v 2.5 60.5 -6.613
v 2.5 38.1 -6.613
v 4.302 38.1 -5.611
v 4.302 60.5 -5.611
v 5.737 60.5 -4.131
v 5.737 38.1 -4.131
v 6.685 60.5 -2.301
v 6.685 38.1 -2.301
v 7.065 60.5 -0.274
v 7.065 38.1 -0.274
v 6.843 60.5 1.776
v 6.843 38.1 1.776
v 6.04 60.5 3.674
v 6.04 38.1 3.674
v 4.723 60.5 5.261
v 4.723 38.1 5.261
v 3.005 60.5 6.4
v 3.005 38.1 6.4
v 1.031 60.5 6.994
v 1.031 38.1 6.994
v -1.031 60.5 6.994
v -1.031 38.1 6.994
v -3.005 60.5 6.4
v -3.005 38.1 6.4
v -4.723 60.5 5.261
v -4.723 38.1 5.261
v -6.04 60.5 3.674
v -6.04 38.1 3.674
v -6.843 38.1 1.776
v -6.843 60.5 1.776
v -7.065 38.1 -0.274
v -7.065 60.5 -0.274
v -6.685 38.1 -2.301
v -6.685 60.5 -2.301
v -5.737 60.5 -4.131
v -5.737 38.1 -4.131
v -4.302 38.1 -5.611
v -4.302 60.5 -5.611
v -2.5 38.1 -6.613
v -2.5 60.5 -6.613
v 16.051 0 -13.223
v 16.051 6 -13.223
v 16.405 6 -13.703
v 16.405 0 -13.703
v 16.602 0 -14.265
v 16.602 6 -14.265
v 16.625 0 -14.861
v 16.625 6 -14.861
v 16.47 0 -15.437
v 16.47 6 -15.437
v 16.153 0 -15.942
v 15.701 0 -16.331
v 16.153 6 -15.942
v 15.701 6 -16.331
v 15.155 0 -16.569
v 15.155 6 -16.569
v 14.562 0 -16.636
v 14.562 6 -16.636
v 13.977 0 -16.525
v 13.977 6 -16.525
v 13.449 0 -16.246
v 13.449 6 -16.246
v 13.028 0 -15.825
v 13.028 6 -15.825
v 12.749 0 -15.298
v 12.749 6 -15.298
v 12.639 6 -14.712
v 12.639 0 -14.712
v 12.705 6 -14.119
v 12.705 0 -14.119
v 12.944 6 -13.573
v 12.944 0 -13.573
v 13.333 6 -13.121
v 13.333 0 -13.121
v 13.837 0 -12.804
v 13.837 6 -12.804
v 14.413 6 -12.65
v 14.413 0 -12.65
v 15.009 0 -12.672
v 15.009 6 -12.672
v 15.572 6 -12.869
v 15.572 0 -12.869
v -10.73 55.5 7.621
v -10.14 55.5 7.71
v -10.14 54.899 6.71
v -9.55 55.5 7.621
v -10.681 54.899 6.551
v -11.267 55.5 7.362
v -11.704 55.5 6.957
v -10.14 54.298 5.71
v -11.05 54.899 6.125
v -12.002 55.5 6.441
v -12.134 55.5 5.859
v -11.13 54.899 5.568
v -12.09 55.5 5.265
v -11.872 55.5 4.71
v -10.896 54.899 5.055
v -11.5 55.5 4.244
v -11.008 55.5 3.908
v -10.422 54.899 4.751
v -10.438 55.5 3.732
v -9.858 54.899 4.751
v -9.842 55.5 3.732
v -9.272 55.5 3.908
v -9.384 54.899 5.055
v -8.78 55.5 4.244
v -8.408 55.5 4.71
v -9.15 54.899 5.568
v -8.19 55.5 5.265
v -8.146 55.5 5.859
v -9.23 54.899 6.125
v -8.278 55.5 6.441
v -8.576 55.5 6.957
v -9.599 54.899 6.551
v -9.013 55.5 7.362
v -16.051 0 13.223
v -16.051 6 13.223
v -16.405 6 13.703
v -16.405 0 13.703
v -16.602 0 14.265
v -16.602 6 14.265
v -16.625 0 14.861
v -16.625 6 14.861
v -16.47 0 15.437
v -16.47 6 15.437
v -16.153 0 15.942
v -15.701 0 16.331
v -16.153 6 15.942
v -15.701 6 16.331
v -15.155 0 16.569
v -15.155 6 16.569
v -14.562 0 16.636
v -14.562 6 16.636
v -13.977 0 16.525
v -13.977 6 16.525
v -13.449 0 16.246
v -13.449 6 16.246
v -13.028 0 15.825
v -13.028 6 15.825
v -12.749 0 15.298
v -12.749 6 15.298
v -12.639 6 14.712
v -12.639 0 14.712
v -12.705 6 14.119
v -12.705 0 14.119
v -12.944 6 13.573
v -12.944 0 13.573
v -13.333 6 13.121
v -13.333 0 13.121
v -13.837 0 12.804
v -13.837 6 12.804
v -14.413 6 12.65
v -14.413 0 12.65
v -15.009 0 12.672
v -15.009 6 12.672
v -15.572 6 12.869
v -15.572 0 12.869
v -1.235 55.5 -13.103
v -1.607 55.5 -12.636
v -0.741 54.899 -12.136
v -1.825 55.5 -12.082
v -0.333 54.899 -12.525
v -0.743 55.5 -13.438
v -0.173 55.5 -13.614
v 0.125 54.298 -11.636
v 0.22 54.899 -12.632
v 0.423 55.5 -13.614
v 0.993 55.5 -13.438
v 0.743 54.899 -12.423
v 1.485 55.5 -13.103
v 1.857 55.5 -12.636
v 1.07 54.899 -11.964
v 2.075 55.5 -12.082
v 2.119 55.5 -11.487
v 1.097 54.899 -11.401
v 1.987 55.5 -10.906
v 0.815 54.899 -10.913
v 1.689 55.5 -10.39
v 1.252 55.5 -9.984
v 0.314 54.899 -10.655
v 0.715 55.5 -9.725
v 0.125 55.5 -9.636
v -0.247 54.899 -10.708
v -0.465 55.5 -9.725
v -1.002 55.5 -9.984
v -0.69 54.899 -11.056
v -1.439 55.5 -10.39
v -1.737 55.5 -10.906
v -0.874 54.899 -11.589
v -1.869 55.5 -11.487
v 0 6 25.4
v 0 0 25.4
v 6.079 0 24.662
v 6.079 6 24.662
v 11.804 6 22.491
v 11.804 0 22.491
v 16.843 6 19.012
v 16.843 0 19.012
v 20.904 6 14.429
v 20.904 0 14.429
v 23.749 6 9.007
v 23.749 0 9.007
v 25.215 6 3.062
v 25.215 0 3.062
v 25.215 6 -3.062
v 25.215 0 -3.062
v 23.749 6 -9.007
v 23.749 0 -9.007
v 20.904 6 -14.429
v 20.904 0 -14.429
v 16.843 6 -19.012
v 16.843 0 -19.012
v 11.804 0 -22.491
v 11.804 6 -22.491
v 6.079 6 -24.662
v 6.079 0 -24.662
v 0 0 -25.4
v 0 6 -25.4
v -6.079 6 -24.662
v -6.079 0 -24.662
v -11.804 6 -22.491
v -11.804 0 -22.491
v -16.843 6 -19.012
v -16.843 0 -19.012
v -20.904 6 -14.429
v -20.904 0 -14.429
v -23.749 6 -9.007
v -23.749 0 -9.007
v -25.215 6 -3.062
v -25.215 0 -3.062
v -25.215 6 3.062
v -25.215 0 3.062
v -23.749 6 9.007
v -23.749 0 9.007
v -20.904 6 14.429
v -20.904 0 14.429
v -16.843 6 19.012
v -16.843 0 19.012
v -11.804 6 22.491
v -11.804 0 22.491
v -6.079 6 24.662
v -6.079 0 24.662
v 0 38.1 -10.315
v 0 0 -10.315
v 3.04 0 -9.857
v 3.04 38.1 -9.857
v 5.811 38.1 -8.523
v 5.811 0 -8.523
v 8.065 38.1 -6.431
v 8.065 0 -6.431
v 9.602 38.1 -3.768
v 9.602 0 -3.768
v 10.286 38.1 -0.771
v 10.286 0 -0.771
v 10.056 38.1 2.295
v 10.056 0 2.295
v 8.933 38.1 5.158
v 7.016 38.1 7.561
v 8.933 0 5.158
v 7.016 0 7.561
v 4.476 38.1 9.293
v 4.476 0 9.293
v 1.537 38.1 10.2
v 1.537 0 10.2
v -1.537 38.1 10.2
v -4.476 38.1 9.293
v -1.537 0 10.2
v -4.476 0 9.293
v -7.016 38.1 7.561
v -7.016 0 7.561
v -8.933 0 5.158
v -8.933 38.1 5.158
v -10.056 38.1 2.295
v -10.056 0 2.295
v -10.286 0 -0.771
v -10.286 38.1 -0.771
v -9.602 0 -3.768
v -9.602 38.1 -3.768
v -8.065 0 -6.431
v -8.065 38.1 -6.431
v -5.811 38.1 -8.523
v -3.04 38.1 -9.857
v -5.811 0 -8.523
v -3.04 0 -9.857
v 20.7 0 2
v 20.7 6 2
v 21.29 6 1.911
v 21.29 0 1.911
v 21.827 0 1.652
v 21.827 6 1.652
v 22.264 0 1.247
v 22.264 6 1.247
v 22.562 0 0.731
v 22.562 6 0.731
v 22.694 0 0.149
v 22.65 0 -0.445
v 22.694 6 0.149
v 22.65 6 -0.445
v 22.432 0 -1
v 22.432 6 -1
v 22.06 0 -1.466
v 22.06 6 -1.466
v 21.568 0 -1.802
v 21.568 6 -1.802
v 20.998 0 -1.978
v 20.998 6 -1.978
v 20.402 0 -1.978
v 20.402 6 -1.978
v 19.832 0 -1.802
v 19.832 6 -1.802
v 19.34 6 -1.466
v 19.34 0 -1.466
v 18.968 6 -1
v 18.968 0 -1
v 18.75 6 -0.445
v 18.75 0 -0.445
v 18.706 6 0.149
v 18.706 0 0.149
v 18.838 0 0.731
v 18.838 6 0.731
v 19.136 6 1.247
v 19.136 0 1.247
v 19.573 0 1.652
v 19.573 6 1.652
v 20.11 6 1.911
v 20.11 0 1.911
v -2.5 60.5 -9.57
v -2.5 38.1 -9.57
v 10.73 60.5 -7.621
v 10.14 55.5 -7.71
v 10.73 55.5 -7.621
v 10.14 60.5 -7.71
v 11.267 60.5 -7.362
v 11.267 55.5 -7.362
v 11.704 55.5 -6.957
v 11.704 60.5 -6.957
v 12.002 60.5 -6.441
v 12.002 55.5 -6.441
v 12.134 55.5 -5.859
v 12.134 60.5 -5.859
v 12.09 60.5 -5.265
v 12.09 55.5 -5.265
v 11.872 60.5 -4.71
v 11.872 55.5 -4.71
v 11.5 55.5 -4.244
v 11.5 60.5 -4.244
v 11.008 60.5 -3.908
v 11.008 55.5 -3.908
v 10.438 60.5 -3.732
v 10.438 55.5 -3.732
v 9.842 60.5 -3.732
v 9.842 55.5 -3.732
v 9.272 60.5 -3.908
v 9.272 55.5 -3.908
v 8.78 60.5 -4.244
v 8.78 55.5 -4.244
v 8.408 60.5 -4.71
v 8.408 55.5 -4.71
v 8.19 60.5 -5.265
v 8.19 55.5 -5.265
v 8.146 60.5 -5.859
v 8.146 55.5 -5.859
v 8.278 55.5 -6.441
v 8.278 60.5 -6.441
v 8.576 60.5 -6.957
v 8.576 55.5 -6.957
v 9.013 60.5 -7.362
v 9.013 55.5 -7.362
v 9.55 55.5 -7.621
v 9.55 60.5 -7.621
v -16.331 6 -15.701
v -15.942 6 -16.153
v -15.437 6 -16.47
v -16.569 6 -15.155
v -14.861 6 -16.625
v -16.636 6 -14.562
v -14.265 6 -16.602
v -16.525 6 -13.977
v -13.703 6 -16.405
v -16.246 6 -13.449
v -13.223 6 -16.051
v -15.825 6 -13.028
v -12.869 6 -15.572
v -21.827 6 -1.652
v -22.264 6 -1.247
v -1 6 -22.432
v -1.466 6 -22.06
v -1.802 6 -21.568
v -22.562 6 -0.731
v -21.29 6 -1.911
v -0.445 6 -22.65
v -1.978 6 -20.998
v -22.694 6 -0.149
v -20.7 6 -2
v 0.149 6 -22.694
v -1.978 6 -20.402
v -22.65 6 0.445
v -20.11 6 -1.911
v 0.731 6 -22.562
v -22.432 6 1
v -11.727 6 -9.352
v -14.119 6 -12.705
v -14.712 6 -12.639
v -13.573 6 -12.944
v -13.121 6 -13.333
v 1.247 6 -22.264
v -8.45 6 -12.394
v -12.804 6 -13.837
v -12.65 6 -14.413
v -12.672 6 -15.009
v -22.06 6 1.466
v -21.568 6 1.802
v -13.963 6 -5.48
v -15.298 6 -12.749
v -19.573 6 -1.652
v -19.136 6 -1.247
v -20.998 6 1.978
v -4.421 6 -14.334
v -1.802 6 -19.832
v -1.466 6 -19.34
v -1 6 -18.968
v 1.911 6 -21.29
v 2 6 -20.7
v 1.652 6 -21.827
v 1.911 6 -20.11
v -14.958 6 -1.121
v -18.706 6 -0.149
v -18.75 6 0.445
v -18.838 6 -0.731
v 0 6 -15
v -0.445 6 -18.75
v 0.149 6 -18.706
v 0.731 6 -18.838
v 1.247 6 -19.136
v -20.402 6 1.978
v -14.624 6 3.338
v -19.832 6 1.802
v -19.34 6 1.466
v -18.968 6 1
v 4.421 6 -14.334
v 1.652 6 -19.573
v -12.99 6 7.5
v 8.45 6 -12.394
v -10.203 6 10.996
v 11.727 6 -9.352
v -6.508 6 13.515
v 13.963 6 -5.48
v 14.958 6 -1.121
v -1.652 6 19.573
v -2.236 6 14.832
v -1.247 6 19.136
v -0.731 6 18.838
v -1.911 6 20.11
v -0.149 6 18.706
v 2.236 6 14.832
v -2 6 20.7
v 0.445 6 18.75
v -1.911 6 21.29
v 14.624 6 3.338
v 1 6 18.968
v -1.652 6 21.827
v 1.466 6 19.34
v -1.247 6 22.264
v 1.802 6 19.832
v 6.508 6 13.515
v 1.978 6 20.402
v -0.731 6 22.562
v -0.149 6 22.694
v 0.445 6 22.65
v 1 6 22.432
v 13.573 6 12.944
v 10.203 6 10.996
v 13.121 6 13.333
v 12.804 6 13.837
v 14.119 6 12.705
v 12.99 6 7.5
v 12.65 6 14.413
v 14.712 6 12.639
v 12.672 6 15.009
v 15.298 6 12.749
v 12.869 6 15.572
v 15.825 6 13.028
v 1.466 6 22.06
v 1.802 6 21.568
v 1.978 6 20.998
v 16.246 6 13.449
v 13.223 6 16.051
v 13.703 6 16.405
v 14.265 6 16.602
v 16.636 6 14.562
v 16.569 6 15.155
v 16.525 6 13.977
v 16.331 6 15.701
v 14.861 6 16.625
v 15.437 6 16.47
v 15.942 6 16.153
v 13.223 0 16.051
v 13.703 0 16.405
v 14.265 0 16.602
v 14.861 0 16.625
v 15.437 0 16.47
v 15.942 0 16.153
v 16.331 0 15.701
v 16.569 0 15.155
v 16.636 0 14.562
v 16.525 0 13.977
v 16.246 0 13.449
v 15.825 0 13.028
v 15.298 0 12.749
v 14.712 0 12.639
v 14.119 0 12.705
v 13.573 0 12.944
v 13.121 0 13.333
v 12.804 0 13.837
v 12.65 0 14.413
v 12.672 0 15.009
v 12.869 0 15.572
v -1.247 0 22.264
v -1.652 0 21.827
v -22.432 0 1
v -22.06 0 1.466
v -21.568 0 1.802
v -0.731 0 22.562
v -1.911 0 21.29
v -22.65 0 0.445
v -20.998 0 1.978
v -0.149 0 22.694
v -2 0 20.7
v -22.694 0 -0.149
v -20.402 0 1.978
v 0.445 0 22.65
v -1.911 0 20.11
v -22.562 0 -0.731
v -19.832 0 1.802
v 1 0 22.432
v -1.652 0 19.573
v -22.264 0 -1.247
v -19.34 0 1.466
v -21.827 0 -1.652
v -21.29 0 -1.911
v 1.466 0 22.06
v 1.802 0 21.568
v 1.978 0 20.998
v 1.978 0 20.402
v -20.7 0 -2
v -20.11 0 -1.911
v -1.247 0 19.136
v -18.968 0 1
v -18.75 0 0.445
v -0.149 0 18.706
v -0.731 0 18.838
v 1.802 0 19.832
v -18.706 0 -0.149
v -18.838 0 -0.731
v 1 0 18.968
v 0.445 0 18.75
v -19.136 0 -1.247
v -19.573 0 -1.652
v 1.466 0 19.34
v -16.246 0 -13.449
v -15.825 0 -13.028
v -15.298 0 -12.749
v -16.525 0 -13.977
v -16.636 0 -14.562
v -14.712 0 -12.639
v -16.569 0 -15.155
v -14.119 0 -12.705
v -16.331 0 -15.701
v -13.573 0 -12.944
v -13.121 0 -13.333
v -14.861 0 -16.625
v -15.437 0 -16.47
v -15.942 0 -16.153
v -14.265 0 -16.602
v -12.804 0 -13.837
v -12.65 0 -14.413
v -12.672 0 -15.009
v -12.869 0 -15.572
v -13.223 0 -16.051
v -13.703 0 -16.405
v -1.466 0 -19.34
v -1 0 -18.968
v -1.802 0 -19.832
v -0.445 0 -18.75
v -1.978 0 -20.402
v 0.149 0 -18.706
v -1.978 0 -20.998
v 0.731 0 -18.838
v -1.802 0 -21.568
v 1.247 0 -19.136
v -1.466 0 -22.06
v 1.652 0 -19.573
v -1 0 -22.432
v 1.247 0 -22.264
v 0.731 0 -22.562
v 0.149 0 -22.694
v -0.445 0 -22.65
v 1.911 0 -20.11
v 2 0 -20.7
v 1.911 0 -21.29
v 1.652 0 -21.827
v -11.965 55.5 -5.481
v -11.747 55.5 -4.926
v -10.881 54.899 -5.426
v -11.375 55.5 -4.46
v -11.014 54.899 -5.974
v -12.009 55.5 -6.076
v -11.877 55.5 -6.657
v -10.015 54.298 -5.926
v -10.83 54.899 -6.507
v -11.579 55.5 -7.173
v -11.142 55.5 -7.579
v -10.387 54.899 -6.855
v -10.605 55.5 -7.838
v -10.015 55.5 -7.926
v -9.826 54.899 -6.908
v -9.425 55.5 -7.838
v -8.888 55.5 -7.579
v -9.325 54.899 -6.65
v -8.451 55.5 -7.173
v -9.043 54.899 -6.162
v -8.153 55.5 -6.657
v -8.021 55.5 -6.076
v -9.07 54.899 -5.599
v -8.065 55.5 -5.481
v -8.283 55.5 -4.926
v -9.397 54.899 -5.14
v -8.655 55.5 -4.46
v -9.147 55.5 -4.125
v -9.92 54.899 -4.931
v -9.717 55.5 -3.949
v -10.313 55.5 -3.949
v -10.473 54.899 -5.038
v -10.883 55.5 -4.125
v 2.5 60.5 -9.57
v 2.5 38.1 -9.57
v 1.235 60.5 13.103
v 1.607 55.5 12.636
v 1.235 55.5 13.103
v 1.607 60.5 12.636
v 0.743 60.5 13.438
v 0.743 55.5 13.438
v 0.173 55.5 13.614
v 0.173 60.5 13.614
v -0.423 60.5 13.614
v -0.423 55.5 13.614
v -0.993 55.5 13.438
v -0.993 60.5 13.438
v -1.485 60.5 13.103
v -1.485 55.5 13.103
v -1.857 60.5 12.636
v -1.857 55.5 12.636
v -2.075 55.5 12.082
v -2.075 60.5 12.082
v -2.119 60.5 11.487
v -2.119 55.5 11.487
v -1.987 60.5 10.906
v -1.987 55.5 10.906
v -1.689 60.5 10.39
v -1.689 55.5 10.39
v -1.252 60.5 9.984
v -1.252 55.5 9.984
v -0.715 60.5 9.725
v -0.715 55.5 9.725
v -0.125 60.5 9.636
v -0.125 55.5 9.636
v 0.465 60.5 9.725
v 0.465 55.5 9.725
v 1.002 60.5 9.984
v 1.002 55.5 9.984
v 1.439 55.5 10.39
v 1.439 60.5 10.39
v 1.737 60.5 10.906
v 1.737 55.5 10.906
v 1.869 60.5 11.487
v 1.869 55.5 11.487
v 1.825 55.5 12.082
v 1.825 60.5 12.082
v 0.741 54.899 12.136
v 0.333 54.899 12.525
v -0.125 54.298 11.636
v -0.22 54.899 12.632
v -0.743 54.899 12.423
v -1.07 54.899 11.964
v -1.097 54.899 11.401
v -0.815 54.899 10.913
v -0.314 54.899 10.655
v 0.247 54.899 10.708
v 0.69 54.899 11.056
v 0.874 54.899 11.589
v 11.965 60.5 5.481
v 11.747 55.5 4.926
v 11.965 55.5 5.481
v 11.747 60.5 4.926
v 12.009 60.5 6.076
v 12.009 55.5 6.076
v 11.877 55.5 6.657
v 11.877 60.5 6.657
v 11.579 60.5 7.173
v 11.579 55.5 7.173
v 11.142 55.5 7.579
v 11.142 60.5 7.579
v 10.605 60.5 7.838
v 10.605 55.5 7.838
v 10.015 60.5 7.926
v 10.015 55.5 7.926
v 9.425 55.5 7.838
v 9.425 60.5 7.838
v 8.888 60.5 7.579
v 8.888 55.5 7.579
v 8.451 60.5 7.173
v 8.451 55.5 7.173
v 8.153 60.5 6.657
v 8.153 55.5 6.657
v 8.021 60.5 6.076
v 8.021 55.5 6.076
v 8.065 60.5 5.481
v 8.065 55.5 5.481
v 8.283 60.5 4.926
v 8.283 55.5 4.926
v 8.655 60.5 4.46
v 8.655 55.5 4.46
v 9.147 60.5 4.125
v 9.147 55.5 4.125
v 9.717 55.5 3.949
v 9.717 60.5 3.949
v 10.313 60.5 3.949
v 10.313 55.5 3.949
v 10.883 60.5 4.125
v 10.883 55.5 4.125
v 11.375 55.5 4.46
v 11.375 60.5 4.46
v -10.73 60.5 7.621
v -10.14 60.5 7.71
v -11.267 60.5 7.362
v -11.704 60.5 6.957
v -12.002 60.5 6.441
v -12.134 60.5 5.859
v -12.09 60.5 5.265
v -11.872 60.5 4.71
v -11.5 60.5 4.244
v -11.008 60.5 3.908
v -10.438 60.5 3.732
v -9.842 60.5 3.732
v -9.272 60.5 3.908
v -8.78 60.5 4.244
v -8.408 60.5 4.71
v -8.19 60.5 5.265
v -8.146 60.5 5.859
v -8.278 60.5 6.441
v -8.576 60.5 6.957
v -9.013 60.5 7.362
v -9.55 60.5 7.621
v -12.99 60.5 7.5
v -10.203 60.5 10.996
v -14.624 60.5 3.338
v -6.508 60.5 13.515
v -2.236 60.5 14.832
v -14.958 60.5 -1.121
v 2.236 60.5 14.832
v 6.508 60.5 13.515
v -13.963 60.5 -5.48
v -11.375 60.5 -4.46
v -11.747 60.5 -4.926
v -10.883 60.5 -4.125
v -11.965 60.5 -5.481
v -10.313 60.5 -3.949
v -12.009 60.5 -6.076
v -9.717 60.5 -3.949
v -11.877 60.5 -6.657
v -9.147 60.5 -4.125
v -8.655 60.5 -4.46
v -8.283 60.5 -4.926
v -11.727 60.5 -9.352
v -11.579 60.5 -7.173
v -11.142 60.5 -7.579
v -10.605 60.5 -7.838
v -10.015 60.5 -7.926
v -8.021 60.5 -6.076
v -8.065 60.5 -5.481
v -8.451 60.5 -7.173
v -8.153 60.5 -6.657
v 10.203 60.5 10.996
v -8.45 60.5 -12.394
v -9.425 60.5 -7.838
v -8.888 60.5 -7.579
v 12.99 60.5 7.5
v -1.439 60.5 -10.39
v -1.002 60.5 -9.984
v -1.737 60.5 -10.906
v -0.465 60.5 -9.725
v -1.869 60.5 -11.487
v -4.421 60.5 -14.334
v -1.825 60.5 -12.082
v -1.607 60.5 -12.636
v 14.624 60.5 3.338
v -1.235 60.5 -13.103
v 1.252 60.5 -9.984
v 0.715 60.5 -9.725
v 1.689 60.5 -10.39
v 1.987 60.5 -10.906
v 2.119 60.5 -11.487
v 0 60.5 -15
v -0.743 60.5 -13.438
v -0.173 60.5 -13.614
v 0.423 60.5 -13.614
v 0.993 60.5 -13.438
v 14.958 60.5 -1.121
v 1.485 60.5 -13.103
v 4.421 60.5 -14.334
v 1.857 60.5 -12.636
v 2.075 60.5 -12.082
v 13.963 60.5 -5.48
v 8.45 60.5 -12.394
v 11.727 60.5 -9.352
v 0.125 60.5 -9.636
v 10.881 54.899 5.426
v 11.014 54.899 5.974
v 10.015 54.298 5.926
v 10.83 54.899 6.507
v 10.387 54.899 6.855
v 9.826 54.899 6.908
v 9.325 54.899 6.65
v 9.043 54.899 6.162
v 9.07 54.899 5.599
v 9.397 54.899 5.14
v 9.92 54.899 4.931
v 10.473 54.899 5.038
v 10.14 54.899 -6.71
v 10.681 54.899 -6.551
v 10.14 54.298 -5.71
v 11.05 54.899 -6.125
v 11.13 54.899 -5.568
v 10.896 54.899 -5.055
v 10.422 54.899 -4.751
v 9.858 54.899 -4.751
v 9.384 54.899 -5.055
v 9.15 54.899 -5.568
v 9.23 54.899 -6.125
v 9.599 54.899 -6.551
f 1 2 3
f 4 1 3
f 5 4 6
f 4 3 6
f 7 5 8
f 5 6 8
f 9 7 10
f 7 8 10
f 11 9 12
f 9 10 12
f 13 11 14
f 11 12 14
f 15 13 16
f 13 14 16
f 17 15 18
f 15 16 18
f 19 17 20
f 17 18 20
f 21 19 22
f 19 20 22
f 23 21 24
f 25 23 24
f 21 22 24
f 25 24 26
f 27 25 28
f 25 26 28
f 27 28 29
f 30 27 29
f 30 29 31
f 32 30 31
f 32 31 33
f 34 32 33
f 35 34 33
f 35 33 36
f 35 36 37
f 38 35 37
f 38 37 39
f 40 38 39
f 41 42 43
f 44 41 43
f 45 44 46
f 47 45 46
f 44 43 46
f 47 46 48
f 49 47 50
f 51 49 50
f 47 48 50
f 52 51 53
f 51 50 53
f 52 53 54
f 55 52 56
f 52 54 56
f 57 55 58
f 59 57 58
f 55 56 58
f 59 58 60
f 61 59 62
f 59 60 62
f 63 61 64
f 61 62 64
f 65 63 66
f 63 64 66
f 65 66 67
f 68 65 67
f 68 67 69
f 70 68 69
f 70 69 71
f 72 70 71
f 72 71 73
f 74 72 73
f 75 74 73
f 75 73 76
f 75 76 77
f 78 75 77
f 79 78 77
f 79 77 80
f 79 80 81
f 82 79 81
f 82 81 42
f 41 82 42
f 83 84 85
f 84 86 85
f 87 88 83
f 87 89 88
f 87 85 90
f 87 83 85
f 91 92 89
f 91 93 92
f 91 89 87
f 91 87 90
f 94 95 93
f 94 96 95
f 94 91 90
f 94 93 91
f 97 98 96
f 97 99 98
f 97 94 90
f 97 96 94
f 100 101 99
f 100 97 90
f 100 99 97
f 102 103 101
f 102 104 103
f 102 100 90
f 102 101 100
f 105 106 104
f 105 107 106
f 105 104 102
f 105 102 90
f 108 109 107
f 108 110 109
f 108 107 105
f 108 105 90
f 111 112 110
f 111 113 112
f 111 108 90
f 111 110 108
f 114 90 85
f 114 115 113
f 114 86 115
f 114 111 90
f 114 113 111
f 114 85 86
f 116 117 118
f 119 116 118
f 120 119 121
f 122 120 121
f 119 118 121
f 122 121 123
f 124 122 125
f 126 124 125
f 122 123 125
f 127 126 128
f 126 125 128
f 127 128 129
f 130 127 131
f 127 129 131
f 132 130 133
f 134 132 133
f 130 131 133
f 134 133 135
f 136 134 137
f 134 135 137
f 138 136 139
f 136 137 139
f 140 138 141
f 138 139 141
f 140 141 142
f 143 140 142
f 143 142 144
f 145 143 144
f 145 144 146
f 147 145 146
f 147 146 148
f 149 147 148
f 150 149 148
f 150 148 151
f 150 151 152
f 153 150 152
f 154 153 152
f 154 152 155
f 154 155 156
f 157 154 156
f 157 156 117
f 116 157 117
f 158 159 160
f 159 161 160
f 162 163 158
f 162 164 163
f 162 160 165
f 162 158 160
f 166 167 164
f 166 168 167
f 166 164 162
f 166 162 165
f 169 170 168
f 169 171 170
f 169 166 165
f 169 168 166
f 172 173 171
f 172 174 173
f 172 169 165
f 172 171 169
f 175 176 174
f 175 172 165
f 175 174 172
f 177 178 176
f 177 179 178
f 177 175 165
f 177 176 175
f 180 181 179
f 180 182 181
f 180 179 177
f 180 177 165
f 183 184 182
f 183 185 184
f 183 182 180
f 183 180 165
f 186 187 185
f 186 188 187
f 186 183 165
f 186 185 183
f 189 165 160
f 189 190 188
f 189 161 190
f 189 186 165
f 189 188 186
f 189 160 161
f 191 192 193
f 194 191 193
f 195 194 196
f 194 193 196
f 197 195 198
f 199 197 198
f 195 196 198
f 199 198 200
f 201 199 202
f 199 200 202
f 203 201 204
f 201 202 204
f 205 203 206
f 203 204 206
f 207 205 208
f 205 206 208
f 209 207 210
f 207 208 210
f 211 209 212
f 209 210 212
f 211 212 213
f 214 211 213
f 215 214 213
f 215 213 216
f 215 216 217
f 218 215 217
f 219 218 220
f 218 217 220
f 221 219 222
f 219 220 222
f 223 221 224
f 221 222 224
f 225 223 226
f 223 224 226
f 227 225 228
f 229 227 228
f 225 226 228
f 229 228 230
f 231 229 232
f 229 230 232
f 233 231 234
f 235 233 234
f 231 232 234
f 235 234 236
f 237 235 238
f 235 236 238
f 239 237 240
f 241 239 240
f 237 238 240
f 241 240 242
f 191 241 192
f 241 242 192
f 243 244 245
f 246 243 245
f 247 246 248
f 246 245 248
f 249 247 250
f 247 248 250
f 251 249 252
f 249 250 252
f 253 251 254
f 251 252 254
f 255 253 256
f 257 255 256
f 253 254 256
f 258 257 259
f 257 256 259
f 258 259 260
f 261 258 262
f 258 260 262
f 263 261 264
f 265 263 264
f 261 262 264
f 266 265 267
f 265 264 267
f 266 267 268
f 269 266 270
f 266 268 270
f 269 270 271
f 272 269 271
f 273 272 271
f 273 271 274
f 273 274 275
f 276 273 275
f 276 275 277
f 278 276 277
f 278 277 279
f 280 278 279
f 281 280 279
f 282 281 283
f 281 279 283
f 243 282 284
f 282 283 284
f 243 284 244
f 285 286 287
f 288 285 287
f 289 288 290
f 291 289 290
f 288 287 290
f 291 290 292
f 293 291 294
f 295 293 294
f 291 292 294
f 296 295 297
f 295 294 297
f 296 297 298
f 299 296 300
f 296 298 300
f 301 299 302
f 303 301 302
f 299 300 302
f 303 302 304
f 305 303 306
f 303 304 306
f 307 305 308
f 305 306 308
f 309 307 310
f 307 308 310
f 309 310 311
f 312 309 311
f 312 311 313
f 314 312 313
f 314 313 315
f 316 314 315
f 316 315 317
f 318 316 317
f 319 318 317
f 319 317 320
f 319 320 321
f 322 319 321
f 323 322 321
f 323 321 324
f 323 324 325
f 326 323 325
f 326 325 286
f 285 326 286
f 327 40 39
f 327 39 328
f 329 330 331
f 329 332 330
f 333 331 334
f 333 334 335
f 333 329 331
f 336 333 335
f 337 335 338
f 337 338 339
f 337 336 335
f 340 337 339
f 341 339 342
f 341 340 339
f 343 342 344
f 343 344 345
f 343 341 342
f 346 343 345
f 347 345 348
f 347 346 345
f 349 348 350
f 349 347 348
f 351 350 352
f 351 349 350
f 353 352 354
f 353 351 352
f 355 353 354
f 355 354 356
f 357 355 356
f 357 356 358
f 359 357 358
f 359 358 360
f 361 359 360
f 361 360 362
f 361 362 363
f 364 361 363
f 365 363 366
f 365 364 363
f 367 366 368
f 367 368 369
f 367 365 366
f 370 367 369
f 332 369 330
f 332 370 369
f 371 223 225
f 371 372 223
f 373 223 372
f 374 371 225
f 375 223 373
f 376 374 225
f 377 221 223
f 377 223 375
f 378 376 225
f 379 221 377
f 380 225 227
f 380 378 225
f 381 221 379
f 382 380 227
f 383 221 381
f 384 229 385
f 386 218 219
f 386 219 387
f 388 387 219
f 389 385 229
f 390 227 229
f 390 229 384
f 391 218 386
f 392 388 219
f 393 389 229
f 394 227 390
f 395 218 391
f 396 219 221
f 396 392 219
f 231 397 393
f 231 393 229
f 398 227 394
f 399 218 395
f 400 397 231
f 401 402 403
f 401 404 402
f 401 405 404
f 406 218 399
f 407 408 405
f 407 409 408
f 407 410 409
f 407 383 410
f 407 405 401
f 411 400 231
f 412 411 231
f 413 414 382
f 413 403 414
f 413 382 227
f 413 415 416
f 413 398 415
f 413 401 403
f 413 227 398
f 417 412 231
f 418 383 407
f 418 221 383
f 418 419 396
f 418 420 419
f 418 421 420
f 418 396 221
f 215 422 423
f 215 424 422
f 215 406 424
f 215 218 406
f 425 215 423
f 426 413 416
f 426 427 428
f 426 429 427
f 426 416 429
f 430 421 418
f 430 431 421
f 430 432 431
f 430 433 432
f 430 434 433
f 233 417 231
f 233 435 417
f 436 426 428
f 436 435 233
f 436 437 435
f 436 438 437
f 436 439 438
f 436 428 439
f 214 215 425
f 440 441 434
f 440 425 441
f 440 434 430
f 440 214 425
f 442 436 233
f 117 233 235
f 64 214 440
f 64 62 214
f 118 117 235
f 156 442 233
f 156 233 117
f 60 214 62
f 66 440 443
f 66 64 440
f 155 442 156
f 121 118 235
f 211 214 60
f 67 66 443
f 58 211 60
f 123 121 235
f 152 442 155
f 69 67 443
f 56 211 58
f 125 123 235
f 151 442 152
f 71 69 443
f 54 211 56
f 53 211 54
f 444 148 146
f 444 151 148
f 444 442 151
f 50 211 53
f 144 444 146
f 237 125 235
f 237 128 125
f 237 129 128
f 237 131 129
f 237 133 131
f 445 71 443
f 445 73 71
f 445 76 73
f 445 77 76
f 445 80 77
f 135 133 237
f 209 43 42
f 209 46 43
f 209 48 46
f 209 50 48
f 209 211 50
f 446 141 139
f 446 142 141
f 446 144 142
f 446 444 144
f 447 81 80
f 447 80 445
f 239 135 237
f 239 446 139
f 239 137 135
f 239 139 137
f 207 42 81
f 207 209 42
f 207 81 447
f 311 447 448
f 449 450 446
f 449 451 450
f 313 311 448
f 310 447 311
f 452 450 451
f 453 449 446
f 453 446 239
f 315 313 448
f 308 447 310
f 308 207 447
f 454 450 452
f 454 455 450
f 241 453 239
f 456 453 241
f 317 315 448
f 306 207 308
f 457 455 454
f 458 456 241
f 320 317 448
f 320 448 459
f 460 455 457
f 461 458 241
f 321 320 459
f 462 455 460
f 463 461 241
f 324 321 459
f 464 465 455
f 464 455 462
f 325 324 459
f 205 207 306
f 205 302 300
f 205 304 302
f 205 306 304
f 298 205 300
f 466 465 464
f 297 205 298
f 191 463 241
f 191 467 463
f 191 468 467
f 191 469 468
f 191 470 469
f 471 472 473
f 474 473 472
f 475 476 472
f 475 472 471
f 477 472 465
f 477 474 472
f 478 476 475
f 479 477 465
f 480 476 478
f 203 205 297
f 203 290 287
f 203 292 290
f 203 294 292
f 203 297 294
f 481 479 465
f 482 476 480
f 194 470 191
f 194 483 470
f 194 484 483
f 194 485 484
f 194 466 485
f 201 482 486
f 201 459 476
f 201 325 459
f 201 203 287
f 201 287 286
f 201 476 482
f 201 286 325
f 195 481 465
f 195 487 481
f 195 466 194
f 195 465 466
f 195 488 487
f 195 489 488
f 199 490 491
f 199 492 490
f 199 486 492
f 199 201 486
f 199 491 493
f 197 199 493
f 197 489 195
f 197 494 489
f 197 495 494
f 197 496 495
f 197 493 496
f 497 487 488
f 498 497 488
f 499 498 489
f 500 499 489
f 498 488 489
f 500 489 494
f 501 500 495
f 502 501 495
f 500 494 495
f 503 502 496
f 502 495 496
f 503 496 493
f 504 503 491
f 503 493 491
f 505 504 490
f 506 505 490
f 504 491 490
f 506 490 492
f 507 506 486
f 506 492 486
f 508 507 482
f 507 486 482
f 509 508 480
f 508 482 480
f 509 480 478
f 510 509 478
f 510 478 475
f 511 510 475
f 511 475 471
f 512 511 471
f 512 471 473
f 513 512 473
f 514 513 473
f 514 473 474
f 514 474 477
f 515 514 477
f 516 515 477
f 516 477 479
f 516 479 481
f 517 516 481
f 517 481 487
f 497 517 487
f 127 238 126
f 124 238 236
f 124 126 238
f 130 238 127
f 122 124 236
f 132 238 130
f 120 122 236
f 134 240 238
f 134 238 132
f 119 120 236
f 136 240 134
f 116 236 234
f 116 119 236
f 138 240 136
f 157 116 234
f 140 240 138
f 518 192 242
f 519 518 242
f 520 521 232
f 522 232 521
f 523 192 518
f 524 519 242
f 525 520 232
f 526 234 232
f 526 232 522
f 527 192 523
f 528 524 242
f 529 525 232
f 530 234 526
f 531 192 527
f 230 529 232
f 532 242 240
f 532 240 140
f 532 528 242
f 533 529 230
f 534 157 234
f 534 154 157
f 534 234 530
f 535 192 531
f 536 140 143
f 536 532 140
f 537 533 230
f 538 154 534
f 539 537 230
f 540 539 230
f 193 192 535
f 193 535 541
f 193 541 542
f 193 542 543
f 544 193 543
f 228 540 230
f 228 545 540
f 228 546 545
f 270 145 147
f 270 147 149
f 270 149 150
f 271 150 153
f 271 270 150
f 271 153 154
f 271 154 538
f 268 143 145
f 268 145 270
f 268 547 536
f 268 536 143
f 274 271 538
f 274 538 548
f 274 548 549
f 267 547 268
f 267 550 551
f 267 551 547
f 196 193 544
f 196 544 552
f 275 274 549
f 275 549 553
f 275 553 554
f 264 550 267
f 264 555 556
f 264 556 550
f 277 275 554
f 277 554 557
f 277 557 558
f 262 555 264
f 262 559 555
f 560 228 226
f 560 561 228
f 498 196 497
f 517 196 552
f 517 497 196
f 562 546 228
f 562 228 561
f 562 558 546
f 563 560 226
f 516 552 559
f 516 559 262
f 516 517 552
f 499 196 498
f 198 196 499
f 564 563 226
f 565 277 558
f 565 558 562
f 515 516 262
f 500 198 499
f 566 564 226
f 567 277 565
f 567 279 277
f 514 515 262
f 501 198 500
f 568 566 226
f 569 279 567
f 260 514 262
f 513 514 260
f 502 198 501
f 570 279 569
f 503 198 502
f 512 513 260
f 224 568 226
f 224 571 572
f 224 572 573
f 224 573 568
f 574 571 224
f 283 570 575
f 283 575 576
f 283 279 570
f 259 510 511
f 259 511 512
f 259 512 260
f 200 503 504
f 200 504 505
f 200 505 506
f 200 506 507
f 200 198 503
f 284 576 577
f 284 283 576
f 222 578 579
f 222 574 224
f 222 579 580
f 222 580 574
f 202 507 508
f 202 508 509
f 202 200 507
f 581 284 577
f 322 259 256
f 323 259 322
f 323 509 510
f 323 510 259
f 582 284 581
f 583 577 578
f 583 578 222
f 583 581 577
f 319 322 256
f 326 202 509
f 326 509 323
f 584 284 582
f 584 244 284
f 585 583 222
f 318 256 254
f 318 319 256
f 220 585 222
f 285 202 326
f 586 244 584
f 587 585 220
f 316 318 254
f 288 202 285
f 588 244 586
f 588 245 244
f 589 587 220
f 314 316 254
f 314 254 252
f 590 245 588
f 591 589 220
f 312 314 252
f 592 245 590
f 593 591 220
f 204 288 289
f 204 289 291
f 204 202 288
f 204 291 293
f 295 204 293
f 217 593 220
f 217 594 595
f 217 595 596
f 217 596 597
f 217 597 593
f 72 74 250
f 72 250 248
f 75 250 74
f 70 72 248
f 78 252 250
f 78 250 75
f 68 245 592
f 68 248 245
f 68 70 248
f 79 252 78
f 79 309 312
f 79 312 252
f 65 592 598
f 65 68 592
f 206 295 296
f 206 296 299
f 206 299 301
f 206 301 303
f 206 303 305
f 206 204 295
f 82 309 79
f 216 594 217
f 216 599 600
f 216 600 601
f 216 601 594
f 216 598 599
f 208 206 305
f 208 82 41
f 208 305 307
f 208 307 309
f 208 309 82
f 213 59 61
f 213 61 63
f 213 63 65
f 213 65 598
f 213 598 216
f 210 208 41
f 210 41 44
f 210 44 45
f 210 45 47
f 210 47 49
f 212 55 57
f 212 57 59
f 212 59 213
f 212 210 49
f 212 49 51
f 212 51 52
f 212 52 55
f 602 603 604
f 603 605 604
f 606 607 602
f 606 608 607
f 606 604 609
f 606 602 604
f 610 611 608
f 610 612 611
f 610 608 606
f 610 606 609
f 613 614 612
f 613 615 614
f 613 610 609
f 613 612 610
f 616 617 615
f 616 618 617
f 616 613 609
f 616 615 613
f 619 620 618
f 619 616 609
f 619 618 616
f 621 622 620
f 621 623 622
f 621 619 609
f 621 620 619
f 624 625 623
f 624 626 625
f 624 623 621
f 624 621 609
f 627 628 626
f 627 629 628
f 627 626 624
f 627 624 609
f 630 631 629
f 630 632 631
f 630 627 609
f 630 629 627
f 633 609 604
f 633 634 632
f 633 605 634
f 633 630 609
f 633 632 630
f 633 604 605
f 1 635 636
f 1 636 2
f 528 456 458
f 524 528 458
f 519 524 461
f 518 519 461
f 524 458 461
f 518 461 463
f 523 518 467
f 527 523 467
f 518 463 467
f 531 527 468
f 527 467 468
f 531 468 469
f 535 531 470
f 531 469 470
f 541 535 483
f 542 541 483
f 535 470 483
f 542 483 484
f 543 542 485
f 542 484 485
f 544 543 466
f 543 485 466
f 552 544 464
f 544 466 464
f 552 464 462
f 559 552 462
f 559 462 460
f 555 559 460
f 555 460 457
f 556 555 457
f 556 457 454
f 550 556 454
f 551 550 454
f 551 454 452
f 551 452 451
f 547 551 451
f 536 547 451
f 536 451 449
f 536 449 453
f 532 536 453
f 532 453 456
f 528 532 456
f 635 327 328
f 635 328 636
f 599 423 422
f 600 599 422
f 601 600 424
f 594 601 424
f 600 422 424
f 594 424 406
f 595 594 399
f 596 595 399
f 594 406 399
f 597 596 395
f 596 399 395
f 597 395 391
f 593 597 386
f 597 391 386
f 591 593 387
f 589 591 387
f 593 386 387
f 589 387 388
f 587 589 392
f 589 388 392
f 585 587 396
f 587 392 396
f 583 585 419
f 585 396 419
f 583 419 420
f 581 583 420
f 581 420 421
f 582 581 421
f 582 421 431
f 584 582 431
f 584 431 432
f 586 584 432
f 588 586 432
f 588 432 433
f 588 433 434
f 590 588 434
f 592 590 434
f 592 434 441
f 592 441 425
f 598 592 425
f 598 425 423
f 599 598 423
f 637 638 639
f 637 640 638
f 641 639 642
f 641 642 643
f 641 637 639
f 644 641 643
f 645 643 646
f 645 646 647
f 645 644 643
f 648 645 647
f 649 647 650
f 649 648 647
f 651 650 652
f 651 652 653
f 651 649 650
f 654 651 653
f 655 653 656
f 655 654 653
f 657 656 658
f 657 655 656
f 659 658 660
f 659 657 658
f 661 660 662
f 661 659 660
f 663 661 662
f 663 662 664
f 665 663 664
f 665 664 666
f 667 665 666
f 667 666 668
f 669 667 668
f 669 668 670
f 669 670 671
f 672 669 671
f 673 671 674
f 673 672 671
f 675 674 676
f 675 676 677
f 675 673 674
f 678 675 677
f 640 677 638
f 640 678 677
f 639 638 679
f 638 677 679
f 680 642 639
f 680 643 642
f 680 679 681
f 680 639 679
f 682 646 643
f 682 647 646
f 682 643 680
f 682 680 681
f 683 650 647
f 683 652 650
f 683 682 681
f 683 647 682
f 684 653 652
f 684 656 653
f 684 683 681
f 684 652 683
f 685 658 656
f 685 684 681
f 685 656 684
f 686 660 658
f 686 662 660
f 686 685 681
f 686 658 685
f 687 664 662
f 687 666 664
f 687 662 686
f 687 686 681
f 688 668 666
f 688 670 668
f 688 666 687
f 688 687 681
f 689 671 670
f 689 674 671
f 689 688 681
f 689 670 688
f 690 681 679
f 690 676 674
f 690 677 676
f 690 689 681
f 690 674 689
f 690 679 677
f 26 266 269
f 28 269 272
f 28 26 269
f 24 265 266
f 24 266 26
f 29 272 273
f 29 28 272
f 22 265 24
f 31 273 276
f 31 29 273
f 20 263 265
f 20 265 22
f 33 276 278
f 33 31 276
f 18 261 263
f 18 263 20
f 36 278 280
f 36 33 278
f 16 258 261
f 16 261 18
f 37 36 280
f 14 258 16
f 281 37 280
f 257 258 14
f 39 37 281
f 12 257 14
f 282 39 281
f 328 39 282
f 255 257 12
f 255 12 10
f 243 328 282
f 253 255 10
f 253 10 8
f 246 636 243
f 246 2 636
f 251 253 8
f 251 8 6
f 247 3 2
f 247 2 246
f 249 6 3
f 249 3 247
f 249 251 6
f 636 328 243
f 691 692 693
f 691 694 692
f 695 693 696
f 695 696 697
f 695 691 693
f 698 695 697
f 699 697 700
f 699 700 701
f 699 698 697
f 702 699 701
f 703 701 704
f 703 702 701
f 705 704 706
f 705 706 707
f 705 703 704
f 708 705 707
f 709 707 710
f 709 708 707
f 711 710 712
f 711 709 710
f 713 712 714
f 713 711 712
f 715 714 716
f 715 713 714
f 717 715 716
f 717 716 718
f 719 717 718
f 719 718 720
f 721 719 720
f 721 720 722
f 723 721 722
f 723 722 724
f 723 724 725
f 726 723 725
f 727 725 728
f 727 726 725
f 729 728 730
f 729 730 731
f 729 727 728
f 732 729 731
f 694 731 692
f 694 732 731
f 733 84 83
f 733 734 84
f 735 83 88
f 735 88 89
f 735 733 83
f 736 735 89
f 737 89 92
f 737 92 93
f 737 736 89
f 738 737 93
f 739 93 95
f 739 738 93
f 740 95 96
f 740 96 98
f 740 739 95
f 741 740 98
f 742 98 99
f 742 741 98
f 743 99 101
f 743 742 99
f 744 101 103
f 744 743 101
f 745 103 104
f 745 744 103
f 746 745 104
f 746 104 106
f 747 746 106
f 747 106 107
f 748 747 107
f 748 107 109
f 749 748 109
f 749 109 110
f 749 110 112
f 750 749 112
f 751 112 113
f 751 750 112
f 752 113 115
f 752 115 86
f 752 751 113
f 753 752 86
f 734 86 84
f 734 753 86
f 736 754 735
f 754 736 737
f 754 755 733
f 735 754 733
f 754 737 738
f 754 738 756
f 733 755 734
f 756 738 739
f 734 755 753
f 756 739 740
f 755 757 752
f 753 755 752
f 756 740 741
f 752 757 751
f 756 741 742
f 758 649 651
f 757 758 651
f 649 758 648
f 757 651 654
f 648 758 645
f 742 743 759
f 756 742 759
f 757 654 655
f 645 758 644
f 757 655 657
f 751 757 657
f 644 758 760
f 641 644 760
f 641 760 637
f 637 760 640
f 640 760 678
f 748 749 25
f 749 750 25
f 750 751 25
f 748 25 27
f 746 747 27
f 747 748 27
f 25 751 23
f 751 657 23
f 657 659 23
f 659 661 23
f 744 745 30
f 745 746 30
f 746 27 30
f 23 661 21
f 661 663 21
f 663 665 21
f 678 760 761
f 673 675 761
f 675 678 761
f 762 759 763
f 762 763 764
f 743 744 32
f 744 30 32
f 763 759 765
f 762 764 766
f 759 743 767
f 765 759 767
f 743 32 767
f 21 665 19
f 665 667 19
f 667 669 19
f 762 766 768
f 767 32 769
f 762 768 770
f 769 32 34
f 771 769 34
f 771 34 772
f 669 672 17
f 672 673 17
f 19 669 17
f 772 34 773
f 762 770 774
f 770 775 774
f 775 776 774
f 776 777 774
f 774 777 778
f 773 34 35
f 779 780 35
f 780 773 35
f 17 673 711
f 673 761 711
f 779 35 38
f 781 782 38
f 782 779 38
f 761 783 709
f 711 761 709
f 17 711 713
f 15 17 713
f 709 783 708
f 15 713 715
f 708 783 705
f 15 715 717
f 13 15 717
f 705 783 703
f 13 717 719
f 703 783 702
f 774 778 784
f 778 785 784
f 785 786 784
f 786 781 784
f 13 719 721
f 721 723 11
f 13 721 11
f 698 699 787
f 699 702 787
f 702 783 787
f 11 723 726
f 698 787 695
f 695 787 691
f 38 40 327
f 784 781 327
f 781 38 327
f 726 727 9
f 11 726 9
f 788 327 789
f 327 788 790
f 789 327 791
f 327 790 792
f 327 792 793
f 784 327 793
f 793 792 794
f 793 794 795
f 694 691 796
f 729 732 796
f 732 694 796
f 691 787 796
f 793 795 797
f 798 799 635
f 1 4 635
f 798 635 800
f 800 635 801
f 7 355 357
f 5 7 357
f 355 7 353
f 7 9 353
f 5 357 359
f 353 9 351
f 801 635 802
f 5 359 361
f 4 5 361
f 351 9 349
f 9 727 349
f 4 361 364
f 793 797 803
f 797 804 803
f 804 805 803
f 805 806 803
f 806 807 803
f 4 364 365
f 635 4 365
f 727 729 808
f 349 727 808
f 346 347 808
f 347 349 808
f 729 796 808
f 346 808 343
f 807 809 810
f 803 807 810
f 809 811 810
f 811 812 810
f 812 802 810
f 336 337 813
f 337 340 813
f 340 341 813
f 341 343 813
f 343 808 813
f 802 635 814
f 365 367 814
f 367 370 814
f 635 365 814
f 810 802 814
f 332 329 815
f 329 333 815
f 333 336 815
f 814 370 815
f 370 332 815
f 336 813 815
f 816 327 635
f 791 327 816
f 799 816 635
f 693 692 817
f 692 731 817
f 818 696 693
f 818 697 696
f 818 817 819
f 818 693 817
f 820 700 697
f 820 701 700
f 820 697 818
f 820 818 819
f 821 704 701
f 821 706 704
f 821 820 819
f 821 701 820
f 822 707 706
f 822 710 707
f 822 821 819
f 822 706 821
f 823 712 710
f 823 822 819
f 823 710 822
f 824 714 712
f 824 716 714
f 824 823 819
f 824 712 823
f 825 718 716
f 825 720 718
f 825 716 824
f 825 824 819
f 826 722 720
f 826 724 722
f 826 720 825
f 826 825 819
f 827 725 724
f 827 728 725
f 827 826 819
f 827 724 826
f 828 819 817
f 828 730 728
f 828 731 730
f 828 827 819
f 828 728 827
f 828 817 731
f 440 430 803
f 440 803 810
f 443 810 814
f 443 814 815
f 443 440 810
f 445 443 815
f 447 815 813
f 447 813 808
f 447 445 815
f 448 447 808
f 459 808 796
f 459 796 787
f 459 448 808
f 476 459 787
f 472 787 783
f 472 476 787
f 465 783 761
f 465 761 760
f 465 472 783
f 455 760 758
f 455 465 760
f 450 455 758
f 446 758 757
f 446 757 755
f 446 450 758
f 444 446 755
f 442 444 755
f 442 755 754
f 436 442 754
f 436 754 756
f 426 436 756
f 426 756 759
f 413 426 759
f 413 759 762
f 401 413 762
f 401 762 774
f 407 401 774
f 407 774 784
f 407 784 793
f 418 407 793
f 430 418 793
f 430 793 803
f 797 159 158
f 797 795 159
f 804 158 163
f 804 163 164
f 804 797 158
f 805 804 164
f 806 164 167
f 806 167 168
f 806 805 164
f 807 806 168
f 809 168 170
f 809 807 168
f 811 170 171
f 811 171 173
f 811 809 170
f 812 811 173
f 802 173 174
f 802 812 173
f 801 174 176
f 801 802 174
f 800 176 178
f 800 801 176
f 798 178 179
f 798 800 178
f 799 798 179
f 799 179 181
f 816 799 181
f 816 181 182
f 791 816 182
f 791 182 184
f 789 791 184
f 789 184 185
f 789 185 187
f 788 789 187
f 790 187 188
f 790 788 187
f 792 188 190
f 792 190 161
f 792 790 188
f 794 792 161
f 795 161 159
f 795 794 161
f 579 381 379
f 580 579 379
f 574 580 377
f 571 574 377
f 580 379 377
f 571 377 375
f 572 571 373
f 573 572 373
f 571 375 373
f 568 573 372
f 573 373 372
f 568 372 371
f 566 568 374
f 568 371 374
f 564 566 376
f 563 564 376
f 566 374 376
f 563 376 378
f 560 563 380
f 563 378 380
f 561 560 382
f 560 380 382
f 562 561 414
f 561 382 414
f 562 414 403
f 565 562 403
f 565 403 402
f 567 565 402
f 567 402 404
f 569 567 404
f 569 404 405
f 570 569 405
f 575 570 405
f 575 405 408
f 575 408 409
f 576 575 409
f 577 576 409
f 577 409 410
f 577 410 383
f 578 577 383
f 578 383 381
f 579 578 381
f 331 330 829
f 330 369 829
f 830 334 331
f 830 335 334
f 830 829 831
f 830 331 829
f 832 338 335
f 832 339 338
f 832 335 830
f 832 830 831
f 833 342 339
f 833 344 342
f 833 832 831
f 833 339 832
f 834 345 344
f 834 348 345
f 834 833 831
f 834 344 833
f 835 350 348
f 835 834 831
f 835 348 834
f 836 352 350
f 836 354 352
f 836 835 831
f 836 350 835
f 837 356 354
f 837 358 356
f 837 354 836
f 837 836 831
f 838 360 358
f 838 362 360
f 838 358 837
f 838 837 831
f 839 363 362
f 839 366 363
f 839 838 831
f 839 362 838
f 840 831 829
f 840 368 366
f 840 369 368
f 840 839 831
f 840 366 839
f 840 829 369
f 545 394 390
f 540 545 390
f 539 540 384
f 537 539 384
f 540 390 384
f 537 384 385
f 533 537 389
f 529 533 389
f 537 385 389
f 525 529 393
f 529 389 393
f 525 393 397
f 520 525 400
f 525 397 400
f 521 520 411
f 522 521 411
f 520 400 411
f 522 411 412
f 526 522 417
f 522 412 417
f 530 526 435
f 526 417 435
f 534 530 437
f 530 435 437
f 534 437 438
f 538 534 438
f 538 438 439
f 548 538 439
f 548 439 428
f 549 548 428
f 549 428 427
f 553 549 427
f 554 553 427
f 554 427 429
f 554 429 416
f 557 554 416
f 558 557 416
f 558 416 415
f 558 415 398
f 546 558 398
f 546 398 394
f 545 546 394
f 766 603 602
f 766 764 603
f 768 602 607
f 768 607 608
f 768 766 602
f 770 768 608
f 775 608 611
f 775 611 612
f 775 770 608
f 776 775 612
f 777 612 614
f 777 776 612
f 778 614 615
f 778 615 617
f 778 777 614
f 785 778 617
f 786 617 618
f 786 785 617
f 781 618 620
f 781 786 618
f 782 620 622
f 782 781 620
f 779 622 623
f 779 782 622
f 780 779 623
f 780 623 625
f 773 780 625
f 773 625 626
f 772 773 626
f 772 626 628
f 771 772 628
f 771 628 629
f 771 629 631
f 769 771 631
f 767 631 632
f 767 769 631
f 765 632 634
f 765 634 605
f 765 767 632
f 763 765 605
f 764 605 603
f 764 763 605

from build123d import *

# Parameters (mm, degrees)
SKETCH2_R             = 25.4
BOSS_EXTRUDE2_DEPTH   = 6
SKETCH3_R             = 15
BOSS_EXTRUDE3_DEPTH   = 60.5
SKETCH4_R             = 10.315
CUT_EXTRUDE1_DEPTH    = 38.1
SKETCH5_R             = 7.07
CUT_EXTRUDE2_DEPTH    = 53.363441445
F_4_0MM_DOWEL_HOLE1_D = 4
CIRPATTERN1_COUNT     = 8
CIRPATTERN2_COUNT     = 6
CUT_EXTRUDE3_REACH    = 72.36


with BuildPart() as part:
    # Sketch2 → Boss-Extrude2 (new body)
    with BuildSketch(Plane(origin=(0, 0, 0), x_dir=(1, 0, 0), z_dir=(0, 1, 0))):
        with Locations(Location((0, 0, 0), (0, 0, 270))):
            Circle(SKETCH2_R)
    extrude(amount=BOSS_EXTRUDE2_DEPTH)

    # Sketch3 → Boss-Extrude3 (add)
    with BuildSketch(Plane.XZ):
        with Locations(Location((0, 0, 0), (0, 0, 270))):
            Circle(SKETCH3_R)
    extrude(amount=-BOSS_EXTRUDE3_DEPTH)

    # Sketch4 → Cut-Extrude1 (cut)
    with BuildSketch(Plane.XZ):
        with Locations(Location((0, 0, 0), (0, 0, 270))):
            Circle(SKETCH4_R)
    extrude(amount=-CUT_EXTRUDE1_DEPTH, mode=Mode.SUBTRACT)

    # Sketch5 → Cut-Extrude2 (cut, through all)
    with BuildSketch(Plane.XZ.offset(-38.1)):
        with Locations(Location((0, 0, 0), (0, 0, 270))):
            Circle(SKETCH5_R)
    extrude(amount=-CUT_EXTRUDE2_DEPTH, mode=Mode.SUBTRACT)

    # Ø4.0mm Dowel Hole1 (through all)
    with Locations(Plane(origin=(0, 0, 0), x_dir=(-1, 0, 0), z_dir=(0, -1, 0))):
        with Locations((0, 20.7)):
            f_4_0mm_dowel_hole1 = Hole(F_4_0MM_DOWEL_HOLE1_D / 2)

    # CirPattern1: Ø4.0mm Dowel Hole1 ×8 about axis
    cirpattern1_axis = Axis((0, 0, 0), (0, 1, 0))
    for i in range(1, CIRPATTERN1_COUNT):
        add(f_4_0mm_dowel_hole1.rotate(cirpattern1_axis, i * 360 / CIRPATTERN1_COUNT), mode=Mode.SUBTRACT)

    # Sketch13 → Ø3.0mm Dowel Hole1 (revolve, cut)
    with BuildSketch(Plane(origin=(-10.14, 60.5, 5.71), x_dir=(0, 0, 1), z_dir=(1, 0, 0))):
        Polygon((0, 0), (0, 6.201721238), (2, 5), (2, 0), align=None)
    f_3_0mm_dowel_hole1 = revolve(axis=Axis((-10.14, 66.85, 5.71), (0, -1, 0)), mode=Mode.SUBTRACT)

    # CirPattern2: Ø3.0mm Dowel Hole1 ×6 about axis
    cirpattern2_axis = Axis((0, 0, 0), (0, 1, 0))
    for i in range(1, CIRPATTERN2_COUNT):
        add(f_3_0mm_dowel_hole1.rotate(cirpattern2_axis, i * 360 / CIRPATTERN2_COUNT), mode=Mode.SUBTRACT)

    # Sketch14 → Cut-Extrude3 (cut, up to next)
    with BuildSketch(Plane(origin=(0, 60.5, 0), x_dir=(1, 0, 0), z_dir=(0, 1, 0)), mode=Mode.PRIVATE) as cut_extrude3_sk1:
        with BuildLine():
            Line((-2.5, 9.57), (2.5, 9.57))
            Line((2.5, 9.57), (2.5, 6.613236726))
            ThreePointArc((2.5, 6.613236726), (0, 7.07), (-2.5, 6.613236726))
            Line((-2.5, 6.613236726), (-2.5, 9.57))
        make_face()
    cut_extrude3_tool1 = extrude(cut_extrude3_sk1.sketch, amount=-CUT_EXTRUDE3_REACH, mode=Mode.PRIVATE) & part.part
    add(cut_extrude3_tool1.solids().sort_by_distance((0, 60.5, -8.24142))[0], mode=Mode.SUBTRACT)


solid = part.part
